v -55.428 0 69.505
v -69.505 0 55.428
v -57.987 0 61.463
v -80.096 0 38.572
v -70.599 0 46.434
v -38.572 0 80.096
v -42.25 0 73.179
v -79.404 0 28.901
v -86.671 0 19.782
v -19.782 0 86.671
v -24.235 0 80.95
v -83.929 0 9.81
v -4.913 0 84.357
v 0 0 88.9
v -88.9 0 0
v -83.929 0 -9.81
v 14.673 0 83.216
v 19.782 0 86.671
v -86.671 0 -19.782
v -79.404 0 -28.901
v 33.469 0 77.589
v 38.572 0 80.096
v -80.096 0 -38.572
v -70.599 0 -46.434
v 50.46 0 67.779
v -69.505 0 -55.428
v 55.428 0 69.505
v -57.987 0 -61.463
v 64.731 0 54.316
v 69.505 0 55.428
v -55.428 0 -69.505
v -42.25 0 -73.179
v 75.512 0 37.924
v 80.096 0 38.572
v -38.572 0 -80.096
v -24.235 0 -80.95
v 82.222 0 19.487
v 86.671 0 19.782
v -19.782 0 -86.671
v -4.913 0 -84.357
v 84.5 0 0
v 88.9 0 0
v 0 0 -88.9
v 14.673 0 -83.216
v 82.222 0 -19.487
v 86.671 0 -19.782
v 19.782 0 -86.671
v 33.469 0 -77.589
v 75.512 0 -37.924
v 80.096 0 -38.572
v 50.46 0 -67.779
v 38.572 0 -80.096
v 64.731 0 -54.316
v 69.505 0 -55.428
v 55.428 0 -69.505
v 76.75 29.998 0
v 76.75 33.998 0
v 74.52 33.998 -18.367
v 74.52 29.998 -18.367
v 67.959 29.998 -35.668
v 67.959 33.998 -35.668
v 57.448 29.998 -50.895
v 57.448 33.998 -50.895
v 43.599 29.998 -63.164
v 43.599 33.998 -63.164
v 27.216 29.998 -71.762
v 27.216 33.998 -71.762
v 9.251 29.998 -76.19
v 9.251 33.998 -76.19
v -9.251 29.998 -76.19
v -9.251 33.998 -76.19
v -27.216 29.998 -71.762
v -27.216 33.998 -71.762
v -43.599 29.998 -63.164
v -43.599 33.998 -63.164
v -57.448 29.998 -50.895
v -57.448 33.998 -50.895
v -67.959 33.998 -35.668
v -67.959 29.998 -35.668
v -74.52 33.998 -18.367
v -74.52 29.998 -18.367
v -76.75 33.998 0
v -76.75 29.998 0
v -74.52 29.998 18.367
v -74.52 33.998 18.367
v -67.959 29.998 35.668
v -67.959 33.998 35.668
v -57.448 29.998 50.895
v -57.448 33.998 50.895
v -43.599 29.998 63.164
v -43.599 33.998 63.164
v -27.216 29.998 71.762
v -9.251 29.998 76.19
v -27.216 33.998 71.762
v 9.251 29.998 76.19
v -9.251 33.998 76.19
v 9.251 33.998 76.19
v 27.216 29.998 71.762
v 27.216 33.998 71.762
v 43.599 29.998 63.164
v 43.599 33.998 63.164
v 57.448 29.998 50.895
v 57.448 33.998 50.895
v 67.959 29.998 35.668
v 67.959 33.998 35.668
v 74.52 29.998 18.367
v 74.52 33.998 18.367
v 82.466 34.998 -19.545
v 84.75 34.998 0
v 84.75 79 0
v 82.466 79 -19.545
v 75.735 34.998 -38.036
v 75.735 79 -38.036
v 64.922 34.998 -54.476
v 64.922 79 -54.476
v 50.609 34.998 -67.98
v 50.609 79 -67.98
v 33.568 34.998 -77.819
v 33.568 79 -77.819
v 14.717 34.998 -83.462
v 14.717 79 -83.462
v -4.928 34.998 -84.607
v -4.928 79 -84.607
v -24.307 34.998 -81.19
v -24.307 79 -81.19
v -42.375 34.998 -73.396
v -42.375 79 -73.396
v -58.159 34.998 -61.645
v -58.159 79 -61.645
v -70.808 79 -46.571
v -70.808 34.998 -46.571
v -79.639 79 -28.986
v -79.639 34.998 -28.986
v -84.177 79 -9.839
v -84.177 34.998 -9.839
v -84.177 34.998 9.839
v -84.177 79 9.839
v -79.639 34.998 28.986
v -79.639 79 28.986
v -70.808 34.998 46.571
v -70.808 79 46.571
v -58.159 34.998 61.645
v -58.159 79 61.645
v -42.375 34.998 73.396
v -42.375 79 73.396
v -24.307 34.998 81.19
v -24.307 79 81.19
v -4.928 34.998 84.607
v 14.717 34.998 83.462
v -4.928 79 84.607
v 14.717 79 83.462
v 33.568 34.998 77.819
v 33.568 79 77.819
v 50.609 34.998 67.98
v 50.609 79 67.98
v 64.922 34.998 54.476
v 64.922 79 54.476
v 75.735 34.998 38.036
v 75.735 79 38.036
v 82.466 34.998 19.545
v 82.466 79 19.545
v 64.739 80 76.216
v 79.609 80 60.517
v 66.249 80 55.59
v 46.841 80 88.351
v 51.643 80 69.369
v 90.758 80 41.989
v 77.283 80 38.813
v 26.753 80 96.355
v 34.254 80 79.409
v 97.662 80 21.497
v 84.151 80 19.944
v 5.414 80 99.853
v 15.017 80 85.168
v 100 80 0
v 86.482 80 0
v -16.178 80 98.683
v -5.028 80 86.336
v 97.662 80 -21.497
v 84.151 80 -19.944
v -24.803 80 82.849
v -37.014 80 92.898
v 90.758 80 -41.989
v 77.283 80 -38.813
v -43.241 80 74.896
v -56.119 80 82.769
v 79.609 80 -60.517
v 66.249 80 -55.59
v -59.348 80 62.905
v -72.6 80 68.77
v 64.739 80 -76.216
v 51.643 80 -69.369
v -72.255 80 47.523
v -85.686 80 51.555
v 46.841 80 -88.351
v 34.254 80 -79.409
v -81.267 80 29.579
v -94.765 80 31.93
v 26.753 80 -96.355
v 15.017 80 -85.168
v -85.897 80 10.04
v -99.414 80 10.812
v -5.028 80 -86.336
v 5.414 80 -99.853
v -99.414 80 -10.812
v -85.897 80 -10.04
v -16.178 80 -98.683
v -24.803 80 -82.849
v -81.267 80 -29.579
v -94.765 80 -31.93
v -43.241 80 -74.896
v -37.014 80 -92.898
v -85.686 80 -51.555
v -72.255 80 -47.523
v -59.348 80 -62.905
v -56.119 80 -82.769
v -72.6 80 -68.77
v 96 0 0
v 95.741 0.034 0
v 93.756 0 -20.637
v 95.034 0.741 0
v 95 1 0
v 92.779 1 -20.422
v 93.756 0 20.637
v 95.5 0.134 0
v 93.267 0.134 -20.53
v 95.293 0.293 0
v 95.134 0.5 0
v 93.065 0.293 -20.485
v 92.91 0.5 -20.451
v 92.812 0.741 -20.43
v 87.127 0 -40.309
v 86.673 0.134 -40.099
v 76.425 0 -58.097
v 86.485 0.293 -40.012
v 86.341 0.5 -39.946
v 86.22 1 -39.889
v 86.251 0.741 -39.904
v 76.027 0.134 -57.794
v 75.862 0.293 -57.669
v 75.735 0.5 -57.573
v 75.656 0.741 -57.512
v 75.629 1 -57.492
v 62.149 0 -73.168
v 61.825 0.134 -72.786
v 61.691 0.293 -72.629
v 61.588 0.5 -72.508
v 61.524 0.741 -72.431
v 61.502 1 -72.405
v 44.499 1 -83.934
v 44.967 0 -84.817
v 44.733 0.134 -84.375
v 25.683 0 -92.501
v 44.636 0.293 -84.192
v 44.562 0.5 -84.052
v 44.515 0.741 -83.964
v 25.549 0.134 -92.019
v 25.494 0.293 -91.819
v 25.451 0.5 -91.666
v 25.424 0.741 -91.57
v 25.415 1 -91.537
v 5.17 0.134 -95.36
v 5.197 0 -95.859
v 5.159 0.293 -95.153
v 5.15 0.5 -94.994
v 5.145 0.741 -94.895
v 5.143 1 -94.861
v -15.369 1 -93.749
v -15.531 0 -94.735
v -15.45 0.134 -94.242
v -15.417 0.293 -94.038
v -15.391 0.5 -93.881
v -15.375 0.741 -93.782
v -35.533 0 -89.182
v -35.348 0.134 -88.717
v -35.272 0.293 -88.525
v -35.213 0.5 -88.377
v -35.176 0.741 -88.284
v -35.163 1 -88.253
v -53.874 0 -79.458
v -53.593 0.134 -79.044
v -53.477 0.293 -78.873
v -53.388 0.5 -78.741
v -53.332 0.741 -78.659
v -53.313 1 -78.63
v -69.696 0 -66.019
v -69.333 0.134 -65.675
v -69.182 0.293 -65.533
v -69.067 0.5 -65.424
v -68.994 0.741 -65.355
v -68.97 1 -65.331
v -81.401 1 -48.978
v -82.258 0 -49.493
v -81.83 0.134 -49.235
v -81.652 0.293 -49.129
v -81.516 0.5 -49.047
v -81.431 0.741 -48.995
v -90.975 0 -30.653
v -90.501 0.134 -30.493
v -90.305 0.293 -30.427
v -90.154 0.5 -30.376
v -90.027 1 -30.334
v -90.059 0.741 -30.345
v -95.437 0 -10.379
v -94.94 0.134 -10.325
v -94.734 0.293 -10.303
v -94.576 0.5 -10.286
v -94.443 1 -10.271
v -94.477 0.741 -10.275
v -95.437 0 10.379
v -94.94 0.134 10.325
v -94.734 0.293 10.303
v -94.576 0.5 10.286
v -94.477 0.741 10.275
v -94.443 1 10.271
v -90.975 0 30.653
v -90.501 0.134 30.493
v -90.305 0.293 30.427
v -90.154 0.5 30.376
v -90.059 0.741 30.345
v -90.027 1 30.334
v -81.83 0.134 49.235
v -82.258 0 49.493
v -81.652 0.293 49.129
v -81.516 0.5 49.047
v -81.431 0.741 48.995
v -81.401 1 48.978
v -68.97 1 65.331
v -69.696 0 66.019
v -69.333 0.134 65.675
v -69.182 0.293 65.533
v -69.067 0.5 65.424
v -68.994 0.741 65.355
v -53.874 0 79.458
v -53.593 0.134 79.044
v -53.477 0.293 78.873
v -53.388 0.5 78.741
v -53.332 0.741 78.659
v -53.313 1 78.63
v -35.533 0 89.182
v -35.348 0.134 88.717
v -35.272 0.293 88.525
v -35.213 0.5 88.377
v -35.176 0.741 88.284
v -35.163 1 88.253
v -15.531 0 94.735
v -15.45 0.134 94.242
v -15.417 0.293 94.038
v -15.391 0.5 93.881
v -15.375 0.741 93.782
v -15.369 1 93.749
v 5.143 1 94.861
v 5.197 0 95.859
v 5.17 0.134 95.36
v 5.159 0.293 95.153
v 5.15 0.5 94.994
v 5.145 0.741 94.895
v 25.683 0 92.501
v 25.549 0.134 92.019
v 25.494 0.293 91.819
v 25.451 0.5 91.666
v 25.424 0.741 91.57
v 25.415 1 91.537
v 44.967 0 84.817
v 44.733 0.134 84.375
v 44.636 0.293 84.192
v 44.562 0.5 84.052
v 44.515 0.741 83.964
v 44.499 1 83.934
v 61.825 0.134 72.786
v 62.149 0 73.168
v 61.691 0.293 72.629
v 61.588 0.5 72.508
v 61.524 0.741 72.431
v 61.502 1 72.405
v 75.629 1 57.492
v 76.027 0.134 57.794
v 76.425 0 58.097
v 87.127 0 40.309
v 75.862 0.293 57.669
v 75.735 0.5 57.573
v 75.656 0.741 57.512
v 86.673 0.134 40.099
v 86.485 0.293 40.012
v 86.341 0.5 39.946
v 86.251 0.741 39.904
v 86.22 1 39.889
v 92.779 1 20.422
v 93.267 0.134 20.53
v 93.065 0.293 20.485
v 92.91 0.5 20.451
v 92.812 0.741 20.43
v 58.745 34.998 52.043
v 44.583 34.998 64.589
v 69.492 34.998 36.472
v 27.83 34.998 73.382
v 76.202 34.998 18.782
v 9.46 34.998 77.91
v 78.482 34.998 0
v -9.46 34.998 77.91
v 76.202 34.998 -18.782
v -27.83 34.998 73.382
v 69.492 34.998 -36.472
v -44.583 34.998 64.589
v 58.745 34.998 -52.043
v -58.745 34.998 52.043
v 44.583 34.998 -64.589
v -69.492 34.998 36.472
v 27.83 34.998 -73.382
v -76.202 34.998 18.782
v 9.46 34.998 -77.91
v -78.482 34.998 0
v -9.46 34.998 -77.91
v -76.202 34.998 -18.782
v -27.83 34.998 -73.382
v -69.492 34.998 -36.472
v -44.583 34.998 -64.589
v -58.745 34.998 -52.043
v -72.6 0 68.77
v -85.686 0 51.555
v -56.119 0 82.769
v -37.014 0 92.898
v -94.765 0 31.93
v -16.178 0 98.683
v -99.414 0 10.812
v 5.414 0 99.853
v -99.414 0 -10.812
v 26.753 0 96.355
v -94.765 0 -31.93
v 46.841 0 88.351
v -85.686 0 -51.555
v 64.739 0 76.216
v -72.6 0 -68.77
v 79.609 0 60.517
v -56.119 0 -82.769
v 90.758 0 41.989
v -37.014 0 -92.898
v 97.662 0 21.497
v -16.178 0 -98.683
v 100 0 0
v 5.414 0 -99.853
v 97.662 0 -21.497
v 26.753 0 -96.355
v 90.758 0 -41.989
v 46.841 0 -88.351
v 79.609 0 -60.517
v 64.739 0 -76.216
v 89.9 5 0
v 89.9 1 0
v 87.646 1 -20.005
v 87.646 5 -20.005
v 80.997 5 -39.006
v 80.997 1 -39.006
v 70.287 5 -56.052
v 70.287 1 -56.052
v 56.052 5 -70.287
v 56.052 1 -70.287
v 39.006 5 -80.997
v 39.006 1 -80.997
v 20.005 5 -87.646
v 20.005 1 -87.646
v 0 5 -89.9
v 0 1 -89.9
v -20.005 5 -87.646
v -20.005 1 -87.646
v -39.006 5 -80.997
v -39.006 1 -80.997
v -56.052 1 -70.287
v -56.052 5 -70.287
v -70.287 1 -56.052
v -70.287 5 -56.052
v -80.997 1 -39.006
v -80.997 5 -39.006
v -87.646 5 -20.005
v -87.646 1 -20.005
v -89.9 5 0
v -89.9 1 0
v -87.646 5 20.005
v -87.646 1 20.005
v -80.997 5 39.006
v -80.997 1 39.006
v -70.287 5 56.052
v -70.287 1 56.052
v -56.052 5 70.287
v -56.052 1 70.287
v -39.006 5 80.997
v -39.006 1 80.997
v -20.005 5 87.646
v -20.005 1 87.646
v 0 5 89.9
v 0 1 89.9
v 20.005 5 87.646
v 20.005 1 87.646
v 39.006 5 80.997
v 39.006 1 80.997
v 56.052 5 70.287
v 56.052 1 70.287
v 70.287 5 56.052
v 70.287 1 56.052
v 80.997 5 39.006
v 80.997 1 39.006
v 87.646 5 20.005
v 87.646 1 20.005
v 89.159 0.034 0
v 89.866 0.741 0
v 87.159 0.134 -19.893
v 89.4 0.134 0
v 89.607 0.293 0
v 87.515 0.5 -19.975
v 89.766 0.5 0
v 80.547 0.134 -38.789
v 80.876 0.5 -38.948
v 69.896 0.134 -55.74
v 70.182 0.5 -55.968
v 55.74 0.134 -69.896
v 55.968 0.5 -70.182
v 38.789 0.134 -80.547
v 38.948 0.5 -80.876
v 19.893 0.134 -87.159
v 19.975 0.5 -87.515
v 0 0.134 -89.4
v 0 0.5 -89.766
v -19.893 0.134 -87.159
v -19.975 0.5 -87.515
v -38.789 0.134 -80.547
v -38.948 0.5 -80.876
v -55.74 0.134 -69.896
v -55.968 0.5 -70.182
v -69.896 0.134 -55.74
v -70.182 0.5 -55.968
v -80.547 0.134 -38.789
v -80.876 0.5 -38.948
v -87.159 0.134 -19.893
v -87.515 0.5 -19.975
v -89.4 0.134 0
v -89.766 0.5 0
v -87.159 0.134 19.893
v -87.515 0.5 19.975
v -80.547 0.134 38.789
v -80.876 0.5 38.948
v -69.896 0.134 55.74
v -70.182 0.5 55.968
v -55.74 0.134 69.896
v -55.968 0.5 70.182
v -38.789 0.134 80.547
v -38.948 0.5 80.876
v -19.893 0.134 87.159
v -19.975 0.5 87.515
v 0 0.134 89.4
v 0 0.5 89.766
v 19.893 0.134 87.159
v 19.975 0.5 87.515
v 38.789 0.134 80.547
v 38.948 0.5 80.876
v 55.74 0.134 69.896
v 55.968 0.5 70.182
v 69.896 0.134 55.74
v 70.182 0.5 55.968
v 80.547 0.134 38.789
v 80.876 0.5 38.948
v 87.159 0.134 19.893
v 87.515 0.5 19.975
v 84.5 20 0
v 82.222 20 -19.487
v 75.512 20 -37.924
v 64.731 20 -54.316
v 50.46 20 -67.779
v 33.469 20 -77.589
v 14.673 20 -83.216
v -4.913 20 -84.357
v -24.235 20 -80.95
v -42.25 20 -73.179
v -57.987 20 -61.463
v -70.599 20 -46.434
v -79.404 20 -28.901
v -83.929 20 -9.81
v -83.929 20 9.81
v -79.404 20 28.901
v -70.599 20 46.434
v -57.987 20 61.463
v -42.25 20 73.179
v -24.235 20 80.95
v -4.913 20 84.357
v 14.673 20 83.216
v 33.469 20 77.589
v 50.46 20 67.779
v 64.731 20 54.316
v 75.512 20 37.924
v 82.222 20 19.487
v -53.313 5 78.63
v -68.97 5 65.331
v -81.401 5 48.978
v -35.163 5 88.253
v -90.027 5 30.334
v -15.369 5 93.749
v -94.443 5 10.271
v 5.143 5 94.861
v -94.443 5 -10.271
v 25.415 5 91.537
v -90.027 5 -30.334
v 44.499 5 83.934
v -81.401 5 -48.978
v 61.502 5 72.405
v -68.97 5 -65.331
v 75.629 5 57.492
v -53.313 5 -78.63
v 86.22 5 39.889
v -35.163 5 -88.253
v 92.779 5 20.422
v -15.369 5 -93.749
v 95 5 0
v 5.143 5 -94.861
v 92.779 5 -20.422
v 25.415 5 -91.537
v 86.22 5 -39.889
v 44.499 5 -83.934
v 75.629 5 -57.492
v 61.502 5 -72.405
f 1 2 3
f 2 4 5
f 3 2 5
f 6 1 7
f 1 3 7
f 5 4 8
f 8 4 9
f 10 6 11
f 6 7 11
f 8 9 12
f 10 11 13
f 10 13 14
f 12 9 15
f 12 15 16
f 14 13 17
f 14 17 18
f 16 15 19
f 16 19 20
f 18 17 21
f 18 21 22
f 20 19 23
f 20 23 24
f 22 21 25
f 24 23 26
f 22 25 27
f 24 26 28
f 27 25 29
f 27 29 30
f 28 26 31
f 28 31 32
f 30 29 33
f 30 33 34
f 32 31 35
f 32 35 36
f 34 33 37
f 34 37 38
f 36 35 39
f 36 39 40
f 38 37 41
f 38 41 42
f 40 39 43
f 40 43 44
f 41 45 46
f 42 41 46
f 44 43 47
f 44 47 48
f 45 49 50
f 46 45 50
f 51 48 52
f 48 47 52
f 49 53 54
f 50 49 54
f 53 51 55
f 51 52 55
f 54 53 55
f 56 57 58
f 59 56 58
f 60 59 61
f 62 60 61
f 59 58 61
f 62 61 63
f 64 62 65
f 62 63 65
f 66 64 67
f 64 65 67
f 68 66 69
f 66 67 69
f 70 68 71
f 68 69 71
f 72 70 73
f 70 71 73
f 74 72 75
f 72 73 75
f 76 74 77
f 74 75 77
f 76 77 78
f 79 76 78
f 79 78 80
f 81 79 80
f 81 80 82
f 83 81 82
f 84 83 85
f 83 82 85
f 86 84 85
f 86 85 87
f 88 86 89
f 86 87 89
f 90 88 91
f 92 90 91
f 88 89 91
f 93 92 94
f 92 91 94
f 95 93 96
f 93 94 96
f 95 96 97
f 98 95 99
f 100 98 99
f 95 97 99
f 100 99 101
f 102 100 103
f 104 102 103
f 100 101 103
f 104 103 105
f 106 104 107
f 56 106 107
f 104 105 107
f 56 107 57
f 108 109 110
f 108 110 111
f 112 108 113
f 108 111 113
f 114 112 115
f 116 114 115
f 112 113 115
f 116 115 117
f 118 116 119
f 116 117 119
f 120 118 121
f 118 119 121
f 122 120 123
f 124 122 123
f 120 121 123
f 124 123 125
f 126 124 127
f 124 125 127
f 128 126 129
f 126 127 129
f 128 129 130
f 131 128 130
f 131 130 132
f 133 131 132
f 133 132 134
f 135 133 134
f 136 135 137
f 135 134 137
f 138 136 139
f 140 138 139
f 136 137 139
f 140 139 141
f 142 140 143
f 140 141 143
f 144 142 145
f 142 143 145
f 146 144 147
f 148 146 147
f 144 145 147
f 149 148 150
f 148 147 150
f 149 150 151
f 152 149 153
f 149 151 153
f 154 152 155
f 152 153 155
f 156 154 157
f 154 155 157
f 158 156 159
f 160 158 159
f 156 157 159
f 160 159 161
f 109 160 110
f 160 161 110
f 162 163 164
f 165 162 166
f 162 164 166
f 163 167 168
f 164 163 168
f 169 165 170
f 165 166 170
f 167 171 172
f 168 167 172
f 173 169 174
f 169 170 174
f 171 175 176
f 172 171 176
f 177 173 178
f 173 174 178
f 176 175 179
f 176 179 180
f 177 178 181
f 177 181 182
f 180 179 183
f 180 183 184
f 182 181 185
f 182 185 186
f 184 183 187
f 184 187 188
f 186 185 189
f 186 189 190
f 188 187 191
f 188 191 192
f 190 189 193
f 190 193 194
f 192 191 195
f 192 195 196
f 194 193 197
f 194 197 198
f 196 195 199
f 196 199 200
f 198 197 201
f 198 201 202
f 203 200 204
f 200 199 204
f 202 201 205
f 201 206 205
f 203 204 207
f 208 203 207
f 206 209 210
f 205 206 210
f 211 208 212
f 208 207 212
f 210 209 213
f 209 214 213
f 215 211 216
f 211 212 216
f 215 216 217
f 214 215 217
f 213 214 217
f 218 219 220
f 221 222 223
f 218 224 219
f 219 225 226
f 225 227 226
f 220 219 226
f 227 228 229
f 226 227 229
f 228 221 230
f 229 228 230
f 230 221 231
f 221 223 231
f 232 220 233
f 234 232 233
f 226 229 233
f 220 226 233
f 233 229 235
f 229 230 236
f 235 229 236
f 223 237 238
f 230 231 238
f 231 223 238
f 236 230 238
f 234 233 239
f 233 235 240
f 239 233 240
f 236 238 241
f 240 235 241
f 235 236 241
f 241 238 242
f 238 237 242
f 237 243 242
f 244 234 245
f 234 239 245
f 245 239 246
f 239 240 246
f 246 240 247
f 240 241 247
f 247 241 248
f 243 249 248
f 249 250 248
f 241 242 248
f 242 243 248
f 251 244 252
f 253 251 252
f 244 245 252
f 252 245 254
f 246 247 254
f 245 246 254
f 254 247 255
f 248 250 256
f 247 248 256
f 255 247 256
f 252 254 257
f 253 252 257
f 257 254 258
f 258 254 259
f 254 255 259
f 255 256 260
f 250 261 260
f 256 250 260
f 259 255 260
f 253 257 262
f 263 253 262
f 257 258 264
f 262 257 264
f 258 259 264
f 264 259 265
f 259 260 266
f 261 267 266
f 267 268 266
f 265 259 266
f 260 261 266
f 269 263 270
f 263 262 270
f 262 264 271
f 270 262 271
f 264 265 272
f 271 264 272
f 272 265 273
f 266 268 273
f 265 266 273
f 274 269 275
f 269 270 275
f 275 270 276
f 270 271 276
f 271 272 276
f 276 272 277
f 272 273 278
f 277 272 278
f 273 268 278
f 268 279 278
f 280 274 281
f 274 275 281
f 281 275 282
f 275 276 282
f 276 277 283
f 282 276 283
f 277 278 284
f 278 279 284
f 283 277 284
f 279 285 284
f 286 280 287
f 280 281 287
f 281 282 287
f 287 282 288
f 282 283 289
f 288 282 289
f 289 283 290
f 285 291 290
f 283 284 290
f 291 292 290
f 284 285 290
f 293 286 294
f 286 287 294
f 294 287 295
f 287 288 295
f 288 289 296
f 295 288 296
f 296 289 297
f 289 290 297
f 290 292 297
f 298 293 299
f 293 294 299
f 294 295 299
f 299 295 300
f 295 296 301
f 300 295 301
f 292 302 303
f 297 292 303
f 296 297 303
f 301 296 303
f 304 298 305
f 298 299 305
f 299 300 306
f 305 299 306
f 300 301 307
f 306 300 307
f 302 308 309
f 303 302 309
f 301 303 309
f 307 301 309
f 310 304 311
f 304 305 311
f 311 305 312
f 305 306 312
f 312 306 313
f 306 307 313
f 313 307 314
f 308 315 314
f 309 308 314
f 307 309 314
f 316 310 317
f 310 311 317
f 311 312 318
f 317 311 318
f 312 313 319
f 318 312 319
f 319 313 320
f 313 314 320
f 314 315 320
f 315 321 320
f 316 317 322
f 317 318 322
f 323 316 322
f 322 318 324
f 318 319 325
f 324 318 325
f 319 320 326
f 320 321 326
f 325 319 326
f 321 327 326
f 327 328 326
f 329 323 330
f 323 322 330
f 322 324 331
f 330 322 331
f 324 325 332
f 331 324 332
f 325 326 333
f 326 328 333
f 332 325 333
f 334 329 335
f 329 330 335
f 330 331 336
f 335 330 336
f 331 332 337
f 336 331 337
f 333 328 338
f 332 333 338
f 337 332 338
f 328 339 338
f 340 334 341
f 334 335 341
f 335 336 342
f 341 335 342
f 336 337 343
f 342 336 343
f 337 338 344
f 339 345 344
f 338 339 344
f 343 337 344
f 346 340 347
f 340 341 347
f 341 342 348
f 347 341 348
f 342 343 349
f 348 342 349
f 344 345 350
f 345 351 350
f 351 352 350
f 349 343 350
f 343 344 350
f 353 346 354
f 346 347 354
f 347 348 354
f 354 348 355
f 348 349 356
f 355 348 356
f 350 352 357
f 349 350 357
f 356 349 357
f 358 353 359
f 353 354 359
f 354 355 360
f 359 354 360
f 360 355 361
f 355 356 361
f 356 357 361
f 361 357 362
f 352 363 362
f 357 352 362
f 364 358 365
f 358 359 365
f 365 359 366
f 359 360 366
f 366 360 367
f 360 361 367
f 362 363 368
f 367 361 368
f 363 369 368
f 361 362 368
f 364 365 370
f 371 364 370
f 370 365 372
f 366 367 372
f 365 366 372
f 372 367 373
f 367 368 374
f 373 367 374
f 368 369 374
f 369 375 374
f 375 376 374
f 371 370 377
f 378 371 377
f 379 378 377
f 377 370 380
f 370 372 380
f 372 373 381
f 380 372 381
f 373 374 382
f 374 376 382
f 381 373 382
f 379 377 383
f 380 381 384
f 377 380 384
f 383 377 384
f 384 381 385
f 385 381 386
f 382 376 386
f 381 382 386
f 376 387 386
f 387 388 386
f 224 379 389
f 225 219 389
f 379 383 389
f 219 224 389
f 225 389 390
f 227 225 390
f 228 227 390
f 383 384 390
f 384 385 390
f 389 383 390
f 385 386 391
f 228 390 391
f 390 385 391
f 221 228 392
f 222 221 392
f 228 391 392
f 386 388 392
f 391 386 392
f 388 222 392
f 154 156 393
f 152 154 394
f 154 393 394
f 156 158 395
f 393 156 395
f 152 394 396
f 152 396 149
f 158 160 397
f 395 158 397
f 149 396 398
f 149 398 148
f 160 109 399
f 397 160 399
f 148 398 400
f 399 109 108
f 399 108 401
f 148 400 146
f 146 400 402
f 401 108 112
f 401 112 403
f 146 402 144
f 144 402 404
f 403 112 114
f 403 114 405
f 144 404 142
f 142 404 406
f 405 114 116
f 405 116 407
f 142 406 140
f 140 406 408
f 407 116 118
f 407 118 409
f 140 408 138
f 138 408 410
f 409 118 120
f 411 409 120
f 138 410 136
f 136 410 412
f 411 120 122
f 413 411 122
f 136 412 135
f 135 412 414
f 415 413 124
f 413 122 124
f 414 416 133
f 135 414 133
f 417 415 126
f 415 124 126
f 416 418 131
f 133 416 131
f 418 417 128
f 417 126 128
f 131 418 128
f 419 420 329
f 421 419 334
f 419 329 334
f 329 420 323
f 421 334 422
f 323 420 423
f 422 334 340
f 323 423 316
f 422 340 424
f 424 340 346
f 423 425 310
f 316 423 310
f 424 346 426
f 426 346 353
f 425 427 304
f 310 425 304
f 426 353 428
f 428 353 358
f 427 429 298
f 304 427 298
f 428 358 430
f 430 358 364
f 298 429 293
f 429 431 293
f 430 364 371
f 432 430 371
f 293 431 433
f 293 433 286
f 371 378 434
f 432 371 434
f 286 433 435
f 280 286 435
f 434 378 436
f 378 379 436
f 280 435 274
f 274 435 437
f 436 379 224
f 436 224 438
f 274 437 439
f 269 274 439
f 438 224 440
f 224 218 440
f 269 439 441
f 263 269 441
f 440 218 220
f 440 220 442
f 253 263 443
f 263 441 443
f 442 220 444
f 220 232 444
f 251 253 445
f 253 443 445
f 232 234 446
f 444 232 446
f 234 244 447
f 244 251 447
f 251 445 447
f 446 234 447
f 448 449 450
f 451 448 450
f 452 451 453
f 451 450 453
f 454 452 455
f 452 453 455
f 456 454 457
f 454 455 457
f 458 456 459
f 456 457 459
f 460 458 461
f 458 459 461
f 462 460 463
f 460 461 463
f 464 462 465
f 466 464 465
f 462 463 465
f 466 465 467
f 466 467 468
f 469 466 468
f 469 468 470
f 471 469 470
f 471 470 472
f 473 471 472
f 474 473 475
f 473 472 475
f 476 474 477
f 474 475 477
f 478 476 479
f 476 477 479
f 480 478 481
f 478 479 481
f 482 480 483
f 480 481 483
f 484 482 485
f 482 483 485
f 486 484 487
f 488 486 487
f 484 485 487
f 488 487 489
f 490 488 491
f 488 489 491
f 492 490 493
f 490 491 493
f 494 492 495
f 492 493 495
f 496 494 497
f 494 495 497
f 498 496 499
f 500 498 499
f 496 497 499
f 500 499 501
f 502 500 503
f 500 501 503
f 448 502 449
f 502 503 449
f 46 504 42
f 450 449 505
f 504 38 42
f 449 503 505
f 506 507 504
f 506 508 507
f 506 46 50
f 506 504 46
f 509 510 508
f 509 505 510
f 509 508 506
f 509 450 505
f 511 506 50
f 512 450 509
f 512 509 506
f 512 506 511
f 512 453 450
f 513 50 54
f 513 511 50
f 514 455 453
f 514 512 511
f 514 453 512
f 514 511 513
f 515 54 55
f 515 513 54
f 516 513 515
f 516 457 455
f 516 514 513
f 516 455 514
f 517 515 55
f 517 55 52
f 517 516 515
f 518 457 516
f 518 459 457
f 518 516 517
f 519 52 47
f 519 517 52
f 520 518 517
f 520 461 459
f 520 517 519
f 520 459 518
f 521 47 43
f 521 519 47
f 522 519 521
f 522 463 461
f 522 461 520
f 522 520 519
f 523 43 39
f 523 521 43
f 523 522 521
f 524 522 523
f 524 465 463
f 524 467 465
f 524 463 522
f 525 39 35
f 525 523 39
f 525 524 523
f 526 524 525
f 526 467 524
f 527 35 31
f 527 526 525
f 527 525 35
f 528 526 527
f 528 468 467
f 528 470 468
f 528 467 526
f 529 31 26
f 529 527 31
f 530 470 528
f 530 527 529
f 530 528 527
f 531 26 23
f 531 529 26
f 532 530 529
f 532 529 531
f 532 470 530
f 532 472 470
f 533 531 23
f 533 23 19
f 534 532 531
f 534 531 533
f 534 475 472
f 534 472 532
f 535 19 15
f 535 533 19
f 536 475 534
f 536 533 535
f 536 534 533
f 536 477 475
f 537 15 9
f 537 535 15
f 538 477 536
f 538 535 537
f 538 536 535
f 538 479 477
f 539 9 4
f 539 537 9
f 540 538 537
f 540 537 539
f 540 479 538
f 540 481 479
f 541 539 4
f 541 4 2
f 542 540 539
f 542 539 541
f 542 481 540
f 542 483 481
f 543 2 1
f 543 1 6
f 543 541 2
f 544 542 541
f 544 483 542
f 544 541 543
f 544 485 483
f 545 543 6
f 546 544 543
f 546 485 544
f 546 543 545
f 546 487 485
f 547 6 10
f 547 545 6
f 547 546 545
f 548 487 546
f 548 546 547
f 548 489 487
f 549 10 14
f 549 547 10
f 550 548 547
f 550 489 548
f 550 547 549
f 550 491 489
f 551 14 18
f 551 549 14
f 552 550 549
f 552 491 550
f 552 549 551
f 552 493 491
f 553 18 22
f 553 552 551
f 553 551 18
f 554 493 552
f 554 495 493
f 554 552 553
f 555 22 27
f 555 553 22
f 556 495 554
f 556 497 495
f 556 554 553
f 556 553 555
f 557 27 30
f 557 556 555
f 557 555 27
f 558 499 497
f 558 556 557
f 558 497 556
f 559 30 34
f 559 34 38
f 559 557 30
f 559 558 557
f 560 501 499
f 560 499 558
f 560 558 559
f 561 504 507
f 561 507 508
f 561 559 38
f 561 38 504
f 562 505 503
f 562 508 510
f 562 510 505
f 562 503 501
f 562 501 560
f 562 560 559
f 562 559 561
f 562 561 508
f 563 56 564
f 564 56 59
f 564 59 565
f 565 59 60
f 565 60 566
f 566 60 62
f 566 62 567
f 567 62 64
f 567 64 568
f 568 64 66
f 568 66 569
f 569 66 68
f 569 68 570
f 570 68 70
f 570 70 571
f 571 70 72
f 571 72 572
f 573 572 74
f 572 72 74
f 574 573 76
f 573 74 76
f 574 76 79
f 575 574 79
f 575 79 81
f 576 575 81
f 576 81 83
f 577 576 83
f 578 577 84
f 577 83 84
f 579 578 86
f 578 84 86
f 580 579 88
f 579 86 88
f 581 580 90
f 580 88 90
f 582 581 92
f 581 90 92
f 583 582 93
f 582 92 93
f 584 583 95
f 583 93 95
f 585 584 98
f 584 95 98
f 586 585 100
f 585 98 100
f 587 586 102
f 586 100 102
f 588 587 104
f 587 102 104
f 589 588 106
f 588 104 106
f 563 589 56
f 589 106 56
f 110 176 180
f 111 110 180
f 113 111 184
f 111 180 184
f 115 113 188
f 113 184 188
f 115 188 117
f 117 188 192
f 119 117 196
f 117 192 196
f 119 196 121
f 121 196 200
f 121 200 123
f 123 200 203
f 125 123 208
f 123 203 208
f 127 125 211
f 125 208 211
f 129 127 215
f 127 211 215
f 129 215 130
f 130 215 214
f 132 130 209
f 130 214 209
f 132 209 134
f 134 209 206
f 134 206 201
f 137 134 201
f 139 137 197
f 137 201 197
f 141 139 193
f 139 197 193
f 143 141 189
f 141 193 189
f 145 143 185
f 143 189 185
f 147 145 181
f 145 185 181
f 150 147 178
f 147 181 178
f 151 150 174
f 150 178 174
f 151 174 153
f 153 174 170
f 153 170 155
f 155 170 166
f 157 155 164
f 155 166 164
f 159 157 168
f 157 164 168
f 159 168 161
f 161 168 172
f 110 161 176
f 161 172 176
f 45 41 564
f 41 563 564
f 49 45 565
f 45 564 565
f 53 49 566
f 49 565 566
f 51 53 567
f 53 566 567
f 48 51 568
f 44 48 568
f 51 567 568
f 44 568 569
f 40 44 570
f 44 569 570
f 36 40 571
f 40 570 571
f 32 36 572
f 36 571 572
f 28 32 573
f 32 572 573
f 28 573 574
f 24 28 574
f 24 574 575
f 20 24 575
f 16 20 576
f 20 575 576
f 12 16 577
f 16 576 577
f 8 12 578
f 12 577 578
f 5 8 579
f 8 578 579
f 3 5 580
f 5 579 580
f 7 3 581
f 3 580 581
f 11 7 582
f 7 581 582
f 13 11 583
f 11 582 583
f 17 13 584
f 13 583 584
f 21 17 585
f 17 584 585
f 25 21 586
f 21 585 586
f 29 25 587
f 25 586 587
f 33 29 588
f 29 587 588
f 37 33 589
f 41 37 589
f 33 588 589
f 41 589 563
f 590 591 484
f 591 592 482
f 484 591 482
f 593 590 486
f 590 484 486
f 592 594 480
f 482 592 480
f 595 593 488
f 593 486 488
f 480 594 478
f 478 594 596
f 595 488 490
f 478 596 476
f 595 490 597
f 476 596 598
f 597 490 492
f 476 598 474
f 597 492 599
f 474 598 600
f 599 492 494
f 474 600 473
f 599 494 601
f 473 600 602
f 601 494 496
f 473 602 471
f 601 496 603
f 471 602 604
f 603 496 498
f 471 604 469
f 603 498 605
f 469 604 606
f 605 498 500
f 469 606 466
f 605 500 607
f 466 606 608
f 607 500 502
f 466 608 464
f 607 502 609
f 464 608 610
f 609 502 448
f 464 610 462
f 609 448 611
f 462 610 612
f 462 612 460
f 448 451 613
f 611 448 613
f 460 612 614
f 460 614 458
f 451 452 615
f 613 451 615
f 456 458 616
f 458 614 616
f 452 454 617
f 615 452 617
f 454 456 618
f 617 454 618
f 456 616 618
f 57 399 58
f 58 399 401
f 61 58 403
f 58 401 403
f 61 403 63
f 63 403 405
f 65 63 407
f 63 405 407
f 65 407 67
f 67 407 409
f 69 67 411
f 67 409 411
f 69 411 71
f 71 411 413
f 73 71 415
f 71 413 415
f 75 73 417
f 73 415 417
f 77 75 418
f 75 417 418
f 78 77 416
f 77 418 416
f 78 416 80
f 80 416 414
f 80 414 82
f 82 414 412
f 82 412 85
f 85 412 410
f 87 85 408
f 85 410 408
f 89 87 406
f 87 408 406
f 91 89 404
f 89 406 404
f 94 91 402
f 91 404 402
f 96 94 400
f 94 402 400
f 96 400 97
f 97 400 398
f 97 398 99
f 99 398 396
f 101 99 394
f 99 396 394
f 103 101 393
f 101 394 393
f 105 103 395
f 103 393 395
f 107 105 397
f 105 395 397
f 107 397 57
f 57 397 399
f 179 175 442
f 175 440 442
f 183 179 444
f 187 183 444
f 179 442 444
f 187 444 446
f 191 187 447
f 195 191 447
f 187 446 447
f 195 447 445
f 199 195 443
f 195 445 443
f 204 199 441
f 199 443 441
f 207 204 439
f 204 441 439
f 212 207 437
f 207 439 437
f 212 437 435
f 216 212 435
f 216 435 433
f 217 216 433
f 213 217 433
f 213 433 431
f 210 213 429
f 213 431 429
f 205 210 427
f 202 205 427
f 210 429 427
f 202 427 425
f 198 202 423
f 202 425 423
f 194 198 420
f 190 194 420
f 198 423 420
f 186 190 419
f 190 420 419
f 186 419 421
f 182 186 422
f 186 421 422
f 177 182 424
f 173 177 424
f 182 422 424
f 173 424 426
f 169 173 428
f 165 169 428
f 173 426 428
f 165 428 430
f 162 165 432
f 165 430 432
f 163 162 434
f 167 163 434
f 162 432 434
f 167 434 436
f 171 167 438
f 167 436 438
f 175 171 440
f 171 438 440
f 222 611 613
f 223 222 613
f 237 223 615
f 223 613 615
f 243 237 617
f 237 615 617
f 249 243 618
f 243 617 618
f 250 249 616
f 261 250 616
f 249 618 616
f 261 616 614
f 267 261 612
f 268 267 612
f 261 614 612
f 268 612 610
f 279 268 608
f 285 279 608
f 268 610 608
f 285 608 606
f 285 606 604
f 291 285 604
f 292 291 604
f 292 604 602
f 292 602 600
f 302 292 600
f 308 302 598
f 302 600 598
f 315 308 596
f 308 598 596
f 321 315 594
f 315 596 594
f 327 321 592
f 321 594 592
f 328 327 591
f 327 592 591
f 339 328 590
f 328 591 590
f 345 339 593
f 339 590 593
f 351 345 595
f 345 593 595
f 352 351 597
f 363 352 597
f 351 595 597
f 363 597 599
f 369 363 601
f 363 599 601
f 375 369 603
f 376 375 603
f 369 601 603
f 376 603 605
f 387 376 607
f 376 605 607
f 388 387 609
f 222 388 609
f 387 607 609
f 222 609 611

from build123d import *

# Parameters (mm, degrees)
CHAMFER2_SIZE         = 1
CHAMFER2_SIZE2        = 1.732050808
CHAMFER2_PART_2_SIZE  = 1
CHAMFER2_PART_2_SIZE2 = 1.732050808
FILLET1_R             = 1


with BuildPart() as part:
    # Sketch1 → Revolve1 (revolve)
    with BuildSketch(Plane.XY):
        Polygon((84.75, 80), (100, 80), (100, 0), (95, 0), (95, 5), (89.9, 5), (89.9, 0), (84.5, 0), (84.5, 20), (76.75, 29.998444487), (76.75, 34.998444487), (84.75, 34.998444487), align=None)
    revolve(axis=Axis((0, 0, 0), (0, 1, 0)))

    # Chamfer2
    chamfer2_edges = [part.edges().sort_by_distance(p)[0] for p in [
        (-84.75, 80, 0),
    ]]
    chamfer2_side = [part.faces().sort_by_distance(p)[0] for p in [
        (-84.75, 57.499222243, 0),
    ]]
    chamfer(chamfer2_edges, length=CHAMFER2_SIZE, length2=CHAMFER2_SIZE2, reference=chamfer2_side[0])

    # Chamfer2 part 2
    chamfer2_part_2_edges = [part.edges().sort_by_distance(p)[0] for p in [
        (-76.75, 34.998444487, 0),
    ]]
    chamfer2_part_2_side = [part.faces().sort_by_distance(p)[0] for p in [
        (-76.75, 32.498444487, 0),
    ]]
    chamfer(chamfer2_part_2_edges, length=CHAMFER2_PART_2_SIZE, length2=CHAMFER2_PART_2_SIZE2, reference=chamfer2_part_2_side[0])

    # Fillet1
    fillet1_edges = [part.edges().sort_by_distance(p)[0] for p in [
        (-95, 0, 0),
        (-89.9, 0, 0),
    ]]
    fillet(fillet1_edges, radius=FILLET1_R)


solid = part.part
